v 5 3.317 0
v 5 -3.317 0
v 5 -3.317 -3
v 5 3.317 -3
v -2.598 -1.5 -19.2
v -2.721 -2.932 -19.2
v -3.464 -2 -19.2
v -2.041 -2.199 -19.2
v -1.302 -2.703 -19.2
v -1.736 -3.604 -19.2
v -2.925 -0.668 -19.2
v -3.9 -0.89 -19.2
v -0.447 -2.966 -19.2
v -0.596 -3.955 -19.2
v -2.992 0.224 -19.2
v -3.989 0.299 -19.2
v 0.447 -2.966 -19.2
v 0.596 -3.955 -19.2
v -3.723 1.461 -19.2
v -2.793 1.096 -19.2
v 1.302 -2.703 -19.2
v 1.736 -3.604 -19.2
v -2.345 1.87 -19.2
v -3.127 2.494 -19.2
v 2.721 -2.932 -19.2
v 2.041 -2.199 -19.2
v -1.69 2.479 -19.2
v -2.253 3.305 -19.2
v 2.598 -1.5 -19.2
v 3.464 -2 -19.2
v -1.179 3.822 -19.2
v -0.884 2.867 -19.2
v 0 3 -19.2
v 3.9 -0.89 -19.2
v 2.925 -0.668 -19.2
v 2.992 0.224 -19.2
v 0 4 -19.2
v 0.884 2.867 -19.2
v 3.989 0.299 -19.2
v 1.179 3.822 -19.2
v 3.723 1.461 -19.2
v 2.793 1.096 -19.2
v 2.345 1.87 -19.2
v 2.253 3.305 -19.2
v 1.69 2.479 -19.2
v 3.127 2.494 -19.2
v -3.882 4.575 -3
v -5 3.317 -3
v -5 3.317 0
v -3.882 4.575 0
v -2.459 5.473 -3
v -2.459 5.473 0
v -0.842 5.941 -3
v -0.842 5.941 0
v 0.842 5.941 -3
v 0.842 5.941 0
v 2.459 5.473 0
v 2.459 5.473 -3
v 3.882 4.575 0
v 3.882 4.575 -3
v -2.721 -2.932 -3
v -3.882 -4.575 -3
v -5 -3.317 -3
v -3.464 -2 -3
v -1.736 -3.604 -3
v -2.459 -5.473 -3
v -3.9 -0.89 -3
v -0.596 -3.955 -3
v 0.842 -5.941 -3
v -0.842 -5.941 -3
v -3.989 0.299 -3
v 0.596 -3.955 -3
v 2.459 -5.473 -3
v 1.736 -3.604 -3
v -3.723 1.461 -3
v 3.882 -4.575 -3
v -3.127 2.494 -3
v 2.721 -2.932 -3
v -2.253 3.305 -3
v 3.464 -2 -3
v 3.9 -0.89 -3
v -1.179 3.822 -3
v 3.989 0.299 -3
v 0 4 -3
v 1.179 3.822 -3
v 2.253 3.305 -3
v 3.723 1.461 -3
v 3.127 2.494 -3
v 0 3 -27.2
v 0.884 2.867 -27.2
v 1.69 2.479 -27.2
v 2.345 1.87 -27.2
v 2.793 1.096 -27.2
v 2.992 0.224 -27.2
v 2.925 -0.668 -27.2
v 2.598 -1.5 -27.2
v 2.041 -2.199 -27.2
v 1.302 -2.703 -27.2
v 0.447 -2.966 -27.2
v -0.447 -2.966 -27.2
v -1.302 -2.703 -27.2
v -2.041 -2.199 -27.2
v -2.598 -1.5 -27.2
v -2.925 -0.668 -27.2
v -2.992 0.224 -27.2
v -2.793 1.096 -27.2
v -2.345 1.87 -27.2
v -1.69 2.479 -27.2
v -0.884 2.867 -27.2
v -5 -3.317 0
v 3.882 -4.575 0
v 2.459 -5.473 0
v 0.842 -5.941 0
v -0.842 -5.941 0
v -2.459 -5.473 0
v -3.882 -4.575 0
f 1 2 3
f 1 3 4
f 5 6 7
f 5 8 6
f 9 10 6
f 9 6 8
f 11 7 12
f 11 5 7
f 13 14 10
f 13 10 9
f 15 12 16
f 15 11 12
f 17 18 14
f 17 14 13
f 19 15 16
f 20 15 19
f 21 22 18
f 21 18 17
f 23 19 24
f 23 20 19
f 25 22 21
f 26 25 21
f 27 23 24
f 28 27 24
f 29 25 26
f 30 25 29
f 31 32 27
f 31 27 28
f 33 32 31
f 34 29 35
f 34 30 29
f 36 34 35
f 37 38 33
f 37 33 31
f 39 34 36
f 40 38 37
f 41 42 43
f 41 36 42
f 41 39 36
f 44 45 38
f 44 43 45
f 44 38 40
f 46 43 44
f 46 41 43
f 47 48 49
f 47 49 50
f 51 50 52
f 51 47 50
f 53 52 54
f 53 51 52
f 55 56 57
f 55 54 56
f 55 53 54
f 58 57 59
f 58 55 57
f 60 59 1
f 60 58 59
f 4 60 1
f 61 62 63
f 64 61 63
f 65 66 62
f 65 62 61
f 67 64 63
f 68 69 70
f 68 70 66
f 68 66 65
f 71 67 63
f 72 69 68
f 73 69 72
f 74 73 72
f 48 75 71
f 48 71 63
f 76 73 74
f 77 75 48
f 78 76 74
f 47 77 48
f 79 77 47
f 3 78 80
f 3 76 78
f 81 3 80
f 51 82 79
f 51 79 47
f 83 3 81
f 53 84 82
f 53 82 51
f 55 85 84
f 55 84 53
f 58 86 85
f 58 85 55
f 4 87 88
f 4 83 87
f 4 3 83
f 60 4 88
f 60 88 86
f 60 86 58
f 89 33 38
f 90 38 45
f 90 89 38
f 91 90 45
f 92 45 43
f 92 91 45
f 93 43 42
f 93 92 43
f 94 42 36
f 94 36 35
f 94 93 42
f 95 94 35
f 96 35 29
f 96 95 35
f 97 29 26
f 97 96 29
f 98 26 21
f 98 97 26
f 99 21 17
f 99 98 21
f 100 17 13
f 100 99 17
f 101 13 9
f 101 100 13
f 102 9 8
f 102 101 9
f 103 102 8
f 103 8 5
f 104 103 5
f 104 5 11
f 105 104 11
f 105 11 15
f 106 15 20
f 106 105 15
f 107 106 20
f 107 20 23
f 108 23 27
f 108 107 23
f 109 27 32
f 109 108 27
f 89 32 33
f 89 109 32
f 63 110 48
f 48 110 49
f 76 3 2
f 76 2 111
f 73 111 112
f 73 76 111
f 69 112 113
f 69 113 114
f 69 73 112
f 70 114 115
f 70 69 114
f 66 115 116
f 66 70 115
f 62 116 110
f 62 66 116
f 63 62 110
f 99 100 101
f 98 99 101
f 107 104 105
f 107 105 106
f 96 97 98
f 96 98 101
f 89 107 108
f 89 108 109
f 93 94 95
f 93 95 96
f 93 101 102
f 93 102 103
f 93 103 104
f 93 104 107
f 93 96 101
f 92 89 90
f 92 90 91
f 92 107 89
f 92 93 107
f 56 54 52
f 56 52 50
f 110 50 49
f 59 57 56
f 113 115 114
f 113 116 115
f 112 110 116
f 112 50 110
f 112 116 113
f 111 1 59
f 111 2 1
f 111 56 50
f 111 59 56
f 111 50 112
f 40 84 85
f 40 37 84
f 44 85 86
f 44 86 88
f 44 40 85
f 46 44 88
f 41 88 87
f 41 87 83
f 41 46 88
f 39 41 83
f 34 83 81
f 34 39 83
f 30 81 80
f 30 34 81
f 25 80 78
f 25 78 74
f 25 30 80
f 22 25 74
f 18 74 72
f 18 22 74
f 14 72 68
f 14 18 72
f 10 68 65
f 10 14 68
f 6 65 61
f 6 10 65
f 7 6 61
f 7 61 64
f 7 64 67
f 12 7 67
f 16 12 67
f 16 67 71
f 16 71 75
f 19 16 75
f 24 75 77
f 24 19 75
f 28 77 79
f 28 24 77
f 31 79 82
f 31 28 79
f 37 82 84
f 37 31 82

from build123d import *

# Parameters (mm, degrees)
SKETCH_3_OUTSIDE_W   = 20.412
SKETCH_3_OUTSIDE_H   = 20.412
SKETCH_3_OUTSIDE_W_2 = 10
SKETCH_3_OUTSIDE_H_2 = 13.079471602
CUT_EXTRUDE_1_DEPTH  = 10


with BuildPart() as part:
    # 草图2 → 旋转1 (revolve)
    with BuildSketch(Plane(origin=(0, 0, 0), x_dir=(0, 0, -1), z_dir=(1, 0, 0))):
        Polygon((0, 0), (0, 6), (3, 6), (3, 4), (19.2, 4), (19.2, 3), (27.2, 3), (27.2, 0), align=None)
    revolve(axis=Axis((0, 0, 0), (0, 0, -1)))

    # 草图3 outside → 切除-拉伸1 (cut)
    with BuildSketch(Plane.XY):
        Rectangle(SKETCH_3_OUTSIDE_W, SKETCH_3_OUTSIDE_H)
        Rectangle(SKETCH_3_OUTSIDE_W_2, SKETCH_3_OUTSIDE_H_2, mode=Mode.SUBTRACT)
    extrude(amount=-CUT_EXTRUDE_1_DEPTH, mode=Mode.SUBTRACT)


solid = part.part
